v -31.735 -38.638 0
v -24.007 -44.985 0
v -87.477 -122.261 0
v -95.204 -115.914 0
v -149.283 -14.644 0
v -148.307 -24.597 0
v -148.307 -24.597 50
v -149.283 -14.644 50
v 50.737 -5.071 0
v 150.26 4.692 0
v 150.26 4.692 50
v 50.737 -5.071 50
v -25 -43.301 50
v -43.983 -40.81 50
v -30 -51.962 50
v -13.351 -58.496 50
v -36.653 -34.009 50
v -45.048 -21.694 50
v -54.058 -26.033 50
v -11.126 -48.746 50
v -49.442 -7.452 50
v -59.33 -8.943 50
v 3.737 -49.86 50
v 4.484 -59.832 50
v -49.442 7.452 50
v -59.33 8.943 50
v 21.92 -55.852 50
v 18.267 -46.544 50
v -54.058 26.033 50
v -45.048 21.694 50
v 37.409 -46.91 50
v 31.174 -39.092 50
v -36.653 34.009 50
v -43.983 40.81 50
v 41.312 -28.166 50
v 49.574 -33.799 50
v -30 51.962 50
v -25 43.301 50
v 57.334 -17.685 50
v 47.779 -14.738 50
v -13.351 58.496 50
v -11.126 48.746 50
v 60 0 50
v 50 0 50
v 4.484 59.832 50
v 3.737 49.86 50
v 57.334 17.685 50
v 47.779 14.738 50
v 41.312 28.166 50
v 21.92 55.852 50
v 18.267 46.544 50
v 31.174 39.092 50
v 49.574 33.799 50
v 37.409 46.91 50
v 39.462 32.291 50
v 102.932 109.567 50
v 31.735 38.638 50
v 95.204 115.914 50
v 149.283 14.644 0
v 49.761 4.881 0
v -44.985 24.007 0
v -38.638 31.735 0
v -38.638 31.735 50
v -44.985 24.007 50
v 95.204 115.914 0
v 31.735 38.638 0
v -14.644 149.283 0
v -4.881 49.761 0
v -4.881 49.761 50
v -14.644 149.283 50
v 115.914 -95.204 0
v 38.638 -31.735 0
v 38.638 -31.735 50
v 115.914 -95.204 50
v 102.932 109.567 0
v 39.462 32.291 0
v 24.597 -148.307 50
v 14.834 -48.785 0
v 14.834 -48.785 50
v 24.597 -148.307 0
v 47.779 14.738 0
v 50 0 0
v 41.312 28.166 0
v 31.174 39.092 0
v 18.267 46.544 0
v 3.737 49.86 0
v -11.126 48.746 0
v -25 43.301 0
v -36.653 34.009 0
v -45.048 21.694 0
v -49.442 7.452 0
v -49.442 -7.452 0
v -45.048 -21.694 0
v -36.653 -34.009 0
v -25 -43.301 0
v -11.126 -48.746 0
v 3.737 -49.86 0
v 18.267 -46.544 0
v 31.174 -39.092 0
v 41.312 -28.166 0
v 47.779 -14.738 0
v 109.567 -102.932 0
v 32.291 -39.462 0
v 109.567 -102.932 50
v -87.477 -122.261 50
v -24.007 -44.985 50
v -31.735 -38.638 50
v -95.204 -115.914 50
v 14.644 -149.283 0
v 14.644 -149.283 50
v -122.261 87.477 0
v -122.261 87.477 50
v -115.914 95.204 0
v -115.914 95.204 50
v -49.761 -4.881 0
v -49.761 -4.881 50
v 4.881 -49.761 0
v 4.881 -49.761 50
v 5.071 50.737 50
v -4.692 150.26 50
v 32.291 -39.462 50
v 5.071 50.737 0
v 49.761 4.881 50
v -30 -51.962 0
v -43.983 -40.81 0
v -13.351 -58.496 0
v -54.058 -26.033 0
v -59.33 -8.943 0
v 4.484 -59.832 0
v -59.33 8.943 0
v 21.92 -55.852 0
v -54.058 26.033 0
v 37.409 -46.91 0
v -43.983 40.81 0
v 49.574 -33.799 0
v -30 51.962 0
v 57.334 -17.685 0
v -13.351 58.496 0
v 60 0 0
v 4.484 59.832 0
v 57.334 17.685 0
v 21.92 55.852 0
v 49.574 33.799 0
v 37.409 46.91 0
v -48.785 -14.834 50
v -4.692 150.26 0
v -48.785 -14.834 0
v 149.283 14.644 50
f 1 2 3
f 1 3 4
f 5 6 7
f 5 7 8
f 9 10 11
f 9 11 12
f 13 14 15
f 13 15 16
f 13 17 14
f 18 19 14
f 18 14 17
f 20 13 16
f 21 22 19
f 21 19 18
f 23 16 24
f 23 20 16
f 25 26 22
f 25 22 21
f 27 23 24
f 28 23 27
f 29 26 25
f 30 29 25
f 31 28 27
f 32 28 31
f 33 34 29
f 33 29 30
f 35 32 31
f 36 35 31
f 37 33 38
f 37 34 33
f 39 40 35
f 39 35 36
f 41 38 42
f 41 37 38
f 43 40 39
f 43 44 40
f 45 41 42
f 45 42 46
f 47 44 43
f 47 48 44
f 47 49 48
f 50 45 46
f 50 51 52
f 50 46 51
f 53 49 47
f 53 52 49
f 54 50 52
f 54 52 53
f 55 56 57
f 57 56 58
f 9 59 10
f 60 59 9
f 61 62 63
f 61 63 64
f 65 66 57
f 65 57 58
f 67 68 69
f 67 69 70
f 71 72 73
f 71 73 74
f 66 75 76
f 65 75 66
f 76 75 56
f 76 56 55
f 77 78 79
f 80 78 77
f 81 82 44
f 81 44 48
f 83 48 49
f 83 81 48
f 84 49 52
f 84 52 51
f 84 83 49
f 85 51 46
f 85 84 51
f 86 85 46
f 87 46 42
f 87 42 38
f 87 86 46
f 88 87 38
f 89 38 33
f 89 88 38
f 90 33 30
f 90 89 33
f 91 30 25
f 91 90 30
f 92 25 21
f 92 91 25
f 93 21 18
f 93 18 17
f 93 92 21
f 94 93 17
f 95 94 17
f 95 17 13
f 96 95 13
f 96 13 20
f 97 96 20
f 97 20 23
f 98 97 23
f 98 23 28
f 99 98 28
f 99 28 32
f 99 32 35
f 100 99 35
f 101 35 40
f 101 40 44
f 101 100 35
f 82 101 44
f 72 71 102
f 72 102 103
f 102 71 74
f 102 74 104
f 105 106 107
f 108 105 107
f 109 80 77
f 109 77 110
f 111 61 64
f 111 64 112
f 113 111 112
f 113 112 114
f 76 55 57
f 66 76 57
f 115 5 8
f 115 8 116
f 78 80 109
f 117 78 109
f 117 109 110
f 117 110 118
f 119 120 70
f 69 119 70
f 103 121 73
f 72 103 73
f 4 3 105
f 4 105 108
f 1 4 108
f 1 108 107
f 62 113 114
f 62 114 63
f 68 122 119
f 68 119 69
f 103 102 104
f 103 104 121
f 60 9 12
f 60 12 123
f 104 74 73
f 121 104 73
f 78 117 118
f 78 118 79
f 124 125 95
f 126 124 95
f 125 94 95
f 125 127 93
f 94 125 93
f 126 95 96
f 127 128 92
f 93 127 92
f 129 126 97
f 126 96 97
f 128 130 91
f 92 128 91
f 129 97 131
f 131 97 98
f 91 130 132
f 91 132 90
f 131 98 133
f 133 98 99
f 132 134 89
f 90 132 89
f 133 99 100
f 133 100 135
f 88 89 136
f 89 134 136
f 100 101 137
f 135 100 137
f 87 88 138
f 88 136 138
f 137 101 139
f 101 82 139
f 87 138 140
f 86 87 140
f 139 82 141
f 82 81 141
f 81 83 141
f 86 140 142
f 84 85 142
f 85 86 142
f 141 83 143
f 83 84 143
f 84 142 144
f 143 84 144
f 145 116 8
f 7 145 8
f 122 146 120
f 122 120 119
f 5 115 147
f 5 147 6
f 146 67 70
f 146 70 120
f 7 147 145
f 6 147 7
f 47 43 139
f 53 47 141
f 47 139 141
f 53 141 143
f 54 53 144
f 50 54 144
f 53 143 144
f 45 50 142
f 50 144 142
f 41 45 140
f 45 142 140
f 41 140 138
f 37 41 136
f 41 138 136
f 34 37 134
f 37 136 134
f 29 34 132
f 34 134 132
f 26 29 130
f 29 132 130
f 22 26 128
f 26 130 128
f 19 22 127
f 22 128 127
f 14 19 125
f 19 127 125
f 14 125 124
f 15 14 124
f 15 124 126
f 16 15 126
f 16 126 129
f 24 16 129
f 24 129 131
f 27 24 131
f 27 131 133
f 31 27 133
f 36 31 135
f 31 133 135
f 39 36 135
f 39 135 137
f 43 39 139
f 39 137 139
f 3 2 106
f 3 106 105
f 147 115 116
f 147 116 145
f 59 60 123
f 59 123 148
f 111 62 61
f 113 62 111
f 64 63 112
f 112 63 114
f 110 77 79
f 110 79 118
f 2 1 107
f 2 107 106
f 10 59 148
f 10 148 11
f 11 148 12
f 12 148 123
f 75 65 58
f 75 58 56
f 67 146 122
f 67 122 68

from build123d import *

# Parameters (mm, degrees)
SKETCH1_R             = 60
SKETCH1_R_2           = 50
EXTRUDE_THIN1_DEPTH   = 50
EXTRUDE_THIN1_2_DEPTH = 50
EXTRUDE_THIN1_3_DEPTH = 50
EXTRUDE_THIN1_4_DEPTH = 50
EXTRUDE_THIN1_5_DEPTH = 50
EXTRUDE_THIN1_6_DEPTH = 50
EXTRUDE_THIN1_7_DEPTH = 50
EXTRUDE_THIN1_8_DEPTH = 50
EXTRUDE_THIN1_9_DEPTH = 50


with BuildPart() as part:
    # Sketch1 → Extrude-Thin1 (new body)
    with BuildSketch(Plane.XY):
        Circle(SKETCH1_R)
        Circle(SKETCH1_R_2, mode=Mode.SUBTRACT)
    extrude(amount=EXTRUDE_THIN1_DEPTH)


with BuildPart() as body_2:
    # Sketch1 → Extrude-Thin1 2 (new body)
    with BuildSketch(Plane.XY):
        Polygon((-149.283436585, -14.644301329), (-49.761145528, -4.881433776), (-48.784858773, -14.833662882), (-148.30714983, -24.596530434), align=None)
    extrude(amount=EXTRUDE_THIN1_2_DEPTH)


with BuildPart() as body_3:
    # Sketch1 → Extrude-Thin1 3 (new body)
    with BuildSketch(Plane.XY):
        Polygon((14.644301329, -149.283436585), (4.881433776, -49.761145528), (14.833662882, -48.784858773), (24.596530434, -148.30714983), align=None)
    extrude(amount=EXTRUDE_THIN1_3_DEPTH)


with BuildPart() as body_4:
    # Sketch1 → Extrude-Thin1 4 (new body)
    with BuildSketch(Plane.XY):
        Polygon((-115.914415103, 95.204245553), (-38.638138368, 31.734748518), (-44.985088071, 24.007120844), (-122.261364807, 87.476617879), align=None)
    extrude(amount=EXTRUDE_THIN1_4_DEPTH)


with BuildPart() as body_5:
    # Sketch1 → Extrude-Thin1 5 (new body)
    with BuildSketch(Plane.XY):
        Polygon((-95.204245553, -115.914415103), (-31.734748518, -38.638138368), (-24.007120844, -44.985088071), (-87.476617879, -122.261364807), align=None)
    extrude(amount=EXTRUDE_THIN1_5_DEPTH)


with BuildPart() as body_6:
    # Sketch1 → Extrude-Thin1 6 (new body)
    with BuildSketch(Plane.XY):
        Polygon((-4.881433776, 49.761145528), (-14.644301329, 149.283436585), (-4.692072223, 150.25972334), (5.070795329, 50.737432284), align=None)
    extrude(amount=EXTRUDE_THIN1_6_DEPTH)


with BuildPart() as body_7:
    # Sketch1 → Extrude-Thin1 7 (new body)
    with BuildSketch(Plane.XY):
        Polygon((31.734748518, 38.638138368), (95.204245553, 115.914415103), (102.931873226, 109.5674654), (39.462376191, 32.291188664), align=None)
    extrude(amount=EXTRUDE_THIN1_7_DEPTH)


with BuildPart() as body_8:
    # Sketch1 → Extrude-Thin1 8 (new body)
    with BuildSketch(Plane.XY):
        Polygon((49.761145528, 4.881433776), (149.283436585, 14.644301329), (150.25972334, 4.692072223), (50.737432284, -5.070795329), align=None)
    extrude(amount=EXTRUDE_THIN1_8_DEPTH)


with BuildPart() as body_9:
    # Sketch1 → Extrude-Thin1 9 (new body)
    with BuildSketch(Plane.XY):
        Polygon((38.638138368, -31.734748518), (115.914415103, -95.204245553), (109.5674654, -102.931873226), (32.291188664, -39.462376191), align=None)
    extrude(amount=EXTRUDE_THIN1_9_DEPTH)


solid = Compound([part.part, body_2.part, body_3.part, body_4.part, body_5.part, body_6.part, body_7.part, body_8.part, body_9.part])
